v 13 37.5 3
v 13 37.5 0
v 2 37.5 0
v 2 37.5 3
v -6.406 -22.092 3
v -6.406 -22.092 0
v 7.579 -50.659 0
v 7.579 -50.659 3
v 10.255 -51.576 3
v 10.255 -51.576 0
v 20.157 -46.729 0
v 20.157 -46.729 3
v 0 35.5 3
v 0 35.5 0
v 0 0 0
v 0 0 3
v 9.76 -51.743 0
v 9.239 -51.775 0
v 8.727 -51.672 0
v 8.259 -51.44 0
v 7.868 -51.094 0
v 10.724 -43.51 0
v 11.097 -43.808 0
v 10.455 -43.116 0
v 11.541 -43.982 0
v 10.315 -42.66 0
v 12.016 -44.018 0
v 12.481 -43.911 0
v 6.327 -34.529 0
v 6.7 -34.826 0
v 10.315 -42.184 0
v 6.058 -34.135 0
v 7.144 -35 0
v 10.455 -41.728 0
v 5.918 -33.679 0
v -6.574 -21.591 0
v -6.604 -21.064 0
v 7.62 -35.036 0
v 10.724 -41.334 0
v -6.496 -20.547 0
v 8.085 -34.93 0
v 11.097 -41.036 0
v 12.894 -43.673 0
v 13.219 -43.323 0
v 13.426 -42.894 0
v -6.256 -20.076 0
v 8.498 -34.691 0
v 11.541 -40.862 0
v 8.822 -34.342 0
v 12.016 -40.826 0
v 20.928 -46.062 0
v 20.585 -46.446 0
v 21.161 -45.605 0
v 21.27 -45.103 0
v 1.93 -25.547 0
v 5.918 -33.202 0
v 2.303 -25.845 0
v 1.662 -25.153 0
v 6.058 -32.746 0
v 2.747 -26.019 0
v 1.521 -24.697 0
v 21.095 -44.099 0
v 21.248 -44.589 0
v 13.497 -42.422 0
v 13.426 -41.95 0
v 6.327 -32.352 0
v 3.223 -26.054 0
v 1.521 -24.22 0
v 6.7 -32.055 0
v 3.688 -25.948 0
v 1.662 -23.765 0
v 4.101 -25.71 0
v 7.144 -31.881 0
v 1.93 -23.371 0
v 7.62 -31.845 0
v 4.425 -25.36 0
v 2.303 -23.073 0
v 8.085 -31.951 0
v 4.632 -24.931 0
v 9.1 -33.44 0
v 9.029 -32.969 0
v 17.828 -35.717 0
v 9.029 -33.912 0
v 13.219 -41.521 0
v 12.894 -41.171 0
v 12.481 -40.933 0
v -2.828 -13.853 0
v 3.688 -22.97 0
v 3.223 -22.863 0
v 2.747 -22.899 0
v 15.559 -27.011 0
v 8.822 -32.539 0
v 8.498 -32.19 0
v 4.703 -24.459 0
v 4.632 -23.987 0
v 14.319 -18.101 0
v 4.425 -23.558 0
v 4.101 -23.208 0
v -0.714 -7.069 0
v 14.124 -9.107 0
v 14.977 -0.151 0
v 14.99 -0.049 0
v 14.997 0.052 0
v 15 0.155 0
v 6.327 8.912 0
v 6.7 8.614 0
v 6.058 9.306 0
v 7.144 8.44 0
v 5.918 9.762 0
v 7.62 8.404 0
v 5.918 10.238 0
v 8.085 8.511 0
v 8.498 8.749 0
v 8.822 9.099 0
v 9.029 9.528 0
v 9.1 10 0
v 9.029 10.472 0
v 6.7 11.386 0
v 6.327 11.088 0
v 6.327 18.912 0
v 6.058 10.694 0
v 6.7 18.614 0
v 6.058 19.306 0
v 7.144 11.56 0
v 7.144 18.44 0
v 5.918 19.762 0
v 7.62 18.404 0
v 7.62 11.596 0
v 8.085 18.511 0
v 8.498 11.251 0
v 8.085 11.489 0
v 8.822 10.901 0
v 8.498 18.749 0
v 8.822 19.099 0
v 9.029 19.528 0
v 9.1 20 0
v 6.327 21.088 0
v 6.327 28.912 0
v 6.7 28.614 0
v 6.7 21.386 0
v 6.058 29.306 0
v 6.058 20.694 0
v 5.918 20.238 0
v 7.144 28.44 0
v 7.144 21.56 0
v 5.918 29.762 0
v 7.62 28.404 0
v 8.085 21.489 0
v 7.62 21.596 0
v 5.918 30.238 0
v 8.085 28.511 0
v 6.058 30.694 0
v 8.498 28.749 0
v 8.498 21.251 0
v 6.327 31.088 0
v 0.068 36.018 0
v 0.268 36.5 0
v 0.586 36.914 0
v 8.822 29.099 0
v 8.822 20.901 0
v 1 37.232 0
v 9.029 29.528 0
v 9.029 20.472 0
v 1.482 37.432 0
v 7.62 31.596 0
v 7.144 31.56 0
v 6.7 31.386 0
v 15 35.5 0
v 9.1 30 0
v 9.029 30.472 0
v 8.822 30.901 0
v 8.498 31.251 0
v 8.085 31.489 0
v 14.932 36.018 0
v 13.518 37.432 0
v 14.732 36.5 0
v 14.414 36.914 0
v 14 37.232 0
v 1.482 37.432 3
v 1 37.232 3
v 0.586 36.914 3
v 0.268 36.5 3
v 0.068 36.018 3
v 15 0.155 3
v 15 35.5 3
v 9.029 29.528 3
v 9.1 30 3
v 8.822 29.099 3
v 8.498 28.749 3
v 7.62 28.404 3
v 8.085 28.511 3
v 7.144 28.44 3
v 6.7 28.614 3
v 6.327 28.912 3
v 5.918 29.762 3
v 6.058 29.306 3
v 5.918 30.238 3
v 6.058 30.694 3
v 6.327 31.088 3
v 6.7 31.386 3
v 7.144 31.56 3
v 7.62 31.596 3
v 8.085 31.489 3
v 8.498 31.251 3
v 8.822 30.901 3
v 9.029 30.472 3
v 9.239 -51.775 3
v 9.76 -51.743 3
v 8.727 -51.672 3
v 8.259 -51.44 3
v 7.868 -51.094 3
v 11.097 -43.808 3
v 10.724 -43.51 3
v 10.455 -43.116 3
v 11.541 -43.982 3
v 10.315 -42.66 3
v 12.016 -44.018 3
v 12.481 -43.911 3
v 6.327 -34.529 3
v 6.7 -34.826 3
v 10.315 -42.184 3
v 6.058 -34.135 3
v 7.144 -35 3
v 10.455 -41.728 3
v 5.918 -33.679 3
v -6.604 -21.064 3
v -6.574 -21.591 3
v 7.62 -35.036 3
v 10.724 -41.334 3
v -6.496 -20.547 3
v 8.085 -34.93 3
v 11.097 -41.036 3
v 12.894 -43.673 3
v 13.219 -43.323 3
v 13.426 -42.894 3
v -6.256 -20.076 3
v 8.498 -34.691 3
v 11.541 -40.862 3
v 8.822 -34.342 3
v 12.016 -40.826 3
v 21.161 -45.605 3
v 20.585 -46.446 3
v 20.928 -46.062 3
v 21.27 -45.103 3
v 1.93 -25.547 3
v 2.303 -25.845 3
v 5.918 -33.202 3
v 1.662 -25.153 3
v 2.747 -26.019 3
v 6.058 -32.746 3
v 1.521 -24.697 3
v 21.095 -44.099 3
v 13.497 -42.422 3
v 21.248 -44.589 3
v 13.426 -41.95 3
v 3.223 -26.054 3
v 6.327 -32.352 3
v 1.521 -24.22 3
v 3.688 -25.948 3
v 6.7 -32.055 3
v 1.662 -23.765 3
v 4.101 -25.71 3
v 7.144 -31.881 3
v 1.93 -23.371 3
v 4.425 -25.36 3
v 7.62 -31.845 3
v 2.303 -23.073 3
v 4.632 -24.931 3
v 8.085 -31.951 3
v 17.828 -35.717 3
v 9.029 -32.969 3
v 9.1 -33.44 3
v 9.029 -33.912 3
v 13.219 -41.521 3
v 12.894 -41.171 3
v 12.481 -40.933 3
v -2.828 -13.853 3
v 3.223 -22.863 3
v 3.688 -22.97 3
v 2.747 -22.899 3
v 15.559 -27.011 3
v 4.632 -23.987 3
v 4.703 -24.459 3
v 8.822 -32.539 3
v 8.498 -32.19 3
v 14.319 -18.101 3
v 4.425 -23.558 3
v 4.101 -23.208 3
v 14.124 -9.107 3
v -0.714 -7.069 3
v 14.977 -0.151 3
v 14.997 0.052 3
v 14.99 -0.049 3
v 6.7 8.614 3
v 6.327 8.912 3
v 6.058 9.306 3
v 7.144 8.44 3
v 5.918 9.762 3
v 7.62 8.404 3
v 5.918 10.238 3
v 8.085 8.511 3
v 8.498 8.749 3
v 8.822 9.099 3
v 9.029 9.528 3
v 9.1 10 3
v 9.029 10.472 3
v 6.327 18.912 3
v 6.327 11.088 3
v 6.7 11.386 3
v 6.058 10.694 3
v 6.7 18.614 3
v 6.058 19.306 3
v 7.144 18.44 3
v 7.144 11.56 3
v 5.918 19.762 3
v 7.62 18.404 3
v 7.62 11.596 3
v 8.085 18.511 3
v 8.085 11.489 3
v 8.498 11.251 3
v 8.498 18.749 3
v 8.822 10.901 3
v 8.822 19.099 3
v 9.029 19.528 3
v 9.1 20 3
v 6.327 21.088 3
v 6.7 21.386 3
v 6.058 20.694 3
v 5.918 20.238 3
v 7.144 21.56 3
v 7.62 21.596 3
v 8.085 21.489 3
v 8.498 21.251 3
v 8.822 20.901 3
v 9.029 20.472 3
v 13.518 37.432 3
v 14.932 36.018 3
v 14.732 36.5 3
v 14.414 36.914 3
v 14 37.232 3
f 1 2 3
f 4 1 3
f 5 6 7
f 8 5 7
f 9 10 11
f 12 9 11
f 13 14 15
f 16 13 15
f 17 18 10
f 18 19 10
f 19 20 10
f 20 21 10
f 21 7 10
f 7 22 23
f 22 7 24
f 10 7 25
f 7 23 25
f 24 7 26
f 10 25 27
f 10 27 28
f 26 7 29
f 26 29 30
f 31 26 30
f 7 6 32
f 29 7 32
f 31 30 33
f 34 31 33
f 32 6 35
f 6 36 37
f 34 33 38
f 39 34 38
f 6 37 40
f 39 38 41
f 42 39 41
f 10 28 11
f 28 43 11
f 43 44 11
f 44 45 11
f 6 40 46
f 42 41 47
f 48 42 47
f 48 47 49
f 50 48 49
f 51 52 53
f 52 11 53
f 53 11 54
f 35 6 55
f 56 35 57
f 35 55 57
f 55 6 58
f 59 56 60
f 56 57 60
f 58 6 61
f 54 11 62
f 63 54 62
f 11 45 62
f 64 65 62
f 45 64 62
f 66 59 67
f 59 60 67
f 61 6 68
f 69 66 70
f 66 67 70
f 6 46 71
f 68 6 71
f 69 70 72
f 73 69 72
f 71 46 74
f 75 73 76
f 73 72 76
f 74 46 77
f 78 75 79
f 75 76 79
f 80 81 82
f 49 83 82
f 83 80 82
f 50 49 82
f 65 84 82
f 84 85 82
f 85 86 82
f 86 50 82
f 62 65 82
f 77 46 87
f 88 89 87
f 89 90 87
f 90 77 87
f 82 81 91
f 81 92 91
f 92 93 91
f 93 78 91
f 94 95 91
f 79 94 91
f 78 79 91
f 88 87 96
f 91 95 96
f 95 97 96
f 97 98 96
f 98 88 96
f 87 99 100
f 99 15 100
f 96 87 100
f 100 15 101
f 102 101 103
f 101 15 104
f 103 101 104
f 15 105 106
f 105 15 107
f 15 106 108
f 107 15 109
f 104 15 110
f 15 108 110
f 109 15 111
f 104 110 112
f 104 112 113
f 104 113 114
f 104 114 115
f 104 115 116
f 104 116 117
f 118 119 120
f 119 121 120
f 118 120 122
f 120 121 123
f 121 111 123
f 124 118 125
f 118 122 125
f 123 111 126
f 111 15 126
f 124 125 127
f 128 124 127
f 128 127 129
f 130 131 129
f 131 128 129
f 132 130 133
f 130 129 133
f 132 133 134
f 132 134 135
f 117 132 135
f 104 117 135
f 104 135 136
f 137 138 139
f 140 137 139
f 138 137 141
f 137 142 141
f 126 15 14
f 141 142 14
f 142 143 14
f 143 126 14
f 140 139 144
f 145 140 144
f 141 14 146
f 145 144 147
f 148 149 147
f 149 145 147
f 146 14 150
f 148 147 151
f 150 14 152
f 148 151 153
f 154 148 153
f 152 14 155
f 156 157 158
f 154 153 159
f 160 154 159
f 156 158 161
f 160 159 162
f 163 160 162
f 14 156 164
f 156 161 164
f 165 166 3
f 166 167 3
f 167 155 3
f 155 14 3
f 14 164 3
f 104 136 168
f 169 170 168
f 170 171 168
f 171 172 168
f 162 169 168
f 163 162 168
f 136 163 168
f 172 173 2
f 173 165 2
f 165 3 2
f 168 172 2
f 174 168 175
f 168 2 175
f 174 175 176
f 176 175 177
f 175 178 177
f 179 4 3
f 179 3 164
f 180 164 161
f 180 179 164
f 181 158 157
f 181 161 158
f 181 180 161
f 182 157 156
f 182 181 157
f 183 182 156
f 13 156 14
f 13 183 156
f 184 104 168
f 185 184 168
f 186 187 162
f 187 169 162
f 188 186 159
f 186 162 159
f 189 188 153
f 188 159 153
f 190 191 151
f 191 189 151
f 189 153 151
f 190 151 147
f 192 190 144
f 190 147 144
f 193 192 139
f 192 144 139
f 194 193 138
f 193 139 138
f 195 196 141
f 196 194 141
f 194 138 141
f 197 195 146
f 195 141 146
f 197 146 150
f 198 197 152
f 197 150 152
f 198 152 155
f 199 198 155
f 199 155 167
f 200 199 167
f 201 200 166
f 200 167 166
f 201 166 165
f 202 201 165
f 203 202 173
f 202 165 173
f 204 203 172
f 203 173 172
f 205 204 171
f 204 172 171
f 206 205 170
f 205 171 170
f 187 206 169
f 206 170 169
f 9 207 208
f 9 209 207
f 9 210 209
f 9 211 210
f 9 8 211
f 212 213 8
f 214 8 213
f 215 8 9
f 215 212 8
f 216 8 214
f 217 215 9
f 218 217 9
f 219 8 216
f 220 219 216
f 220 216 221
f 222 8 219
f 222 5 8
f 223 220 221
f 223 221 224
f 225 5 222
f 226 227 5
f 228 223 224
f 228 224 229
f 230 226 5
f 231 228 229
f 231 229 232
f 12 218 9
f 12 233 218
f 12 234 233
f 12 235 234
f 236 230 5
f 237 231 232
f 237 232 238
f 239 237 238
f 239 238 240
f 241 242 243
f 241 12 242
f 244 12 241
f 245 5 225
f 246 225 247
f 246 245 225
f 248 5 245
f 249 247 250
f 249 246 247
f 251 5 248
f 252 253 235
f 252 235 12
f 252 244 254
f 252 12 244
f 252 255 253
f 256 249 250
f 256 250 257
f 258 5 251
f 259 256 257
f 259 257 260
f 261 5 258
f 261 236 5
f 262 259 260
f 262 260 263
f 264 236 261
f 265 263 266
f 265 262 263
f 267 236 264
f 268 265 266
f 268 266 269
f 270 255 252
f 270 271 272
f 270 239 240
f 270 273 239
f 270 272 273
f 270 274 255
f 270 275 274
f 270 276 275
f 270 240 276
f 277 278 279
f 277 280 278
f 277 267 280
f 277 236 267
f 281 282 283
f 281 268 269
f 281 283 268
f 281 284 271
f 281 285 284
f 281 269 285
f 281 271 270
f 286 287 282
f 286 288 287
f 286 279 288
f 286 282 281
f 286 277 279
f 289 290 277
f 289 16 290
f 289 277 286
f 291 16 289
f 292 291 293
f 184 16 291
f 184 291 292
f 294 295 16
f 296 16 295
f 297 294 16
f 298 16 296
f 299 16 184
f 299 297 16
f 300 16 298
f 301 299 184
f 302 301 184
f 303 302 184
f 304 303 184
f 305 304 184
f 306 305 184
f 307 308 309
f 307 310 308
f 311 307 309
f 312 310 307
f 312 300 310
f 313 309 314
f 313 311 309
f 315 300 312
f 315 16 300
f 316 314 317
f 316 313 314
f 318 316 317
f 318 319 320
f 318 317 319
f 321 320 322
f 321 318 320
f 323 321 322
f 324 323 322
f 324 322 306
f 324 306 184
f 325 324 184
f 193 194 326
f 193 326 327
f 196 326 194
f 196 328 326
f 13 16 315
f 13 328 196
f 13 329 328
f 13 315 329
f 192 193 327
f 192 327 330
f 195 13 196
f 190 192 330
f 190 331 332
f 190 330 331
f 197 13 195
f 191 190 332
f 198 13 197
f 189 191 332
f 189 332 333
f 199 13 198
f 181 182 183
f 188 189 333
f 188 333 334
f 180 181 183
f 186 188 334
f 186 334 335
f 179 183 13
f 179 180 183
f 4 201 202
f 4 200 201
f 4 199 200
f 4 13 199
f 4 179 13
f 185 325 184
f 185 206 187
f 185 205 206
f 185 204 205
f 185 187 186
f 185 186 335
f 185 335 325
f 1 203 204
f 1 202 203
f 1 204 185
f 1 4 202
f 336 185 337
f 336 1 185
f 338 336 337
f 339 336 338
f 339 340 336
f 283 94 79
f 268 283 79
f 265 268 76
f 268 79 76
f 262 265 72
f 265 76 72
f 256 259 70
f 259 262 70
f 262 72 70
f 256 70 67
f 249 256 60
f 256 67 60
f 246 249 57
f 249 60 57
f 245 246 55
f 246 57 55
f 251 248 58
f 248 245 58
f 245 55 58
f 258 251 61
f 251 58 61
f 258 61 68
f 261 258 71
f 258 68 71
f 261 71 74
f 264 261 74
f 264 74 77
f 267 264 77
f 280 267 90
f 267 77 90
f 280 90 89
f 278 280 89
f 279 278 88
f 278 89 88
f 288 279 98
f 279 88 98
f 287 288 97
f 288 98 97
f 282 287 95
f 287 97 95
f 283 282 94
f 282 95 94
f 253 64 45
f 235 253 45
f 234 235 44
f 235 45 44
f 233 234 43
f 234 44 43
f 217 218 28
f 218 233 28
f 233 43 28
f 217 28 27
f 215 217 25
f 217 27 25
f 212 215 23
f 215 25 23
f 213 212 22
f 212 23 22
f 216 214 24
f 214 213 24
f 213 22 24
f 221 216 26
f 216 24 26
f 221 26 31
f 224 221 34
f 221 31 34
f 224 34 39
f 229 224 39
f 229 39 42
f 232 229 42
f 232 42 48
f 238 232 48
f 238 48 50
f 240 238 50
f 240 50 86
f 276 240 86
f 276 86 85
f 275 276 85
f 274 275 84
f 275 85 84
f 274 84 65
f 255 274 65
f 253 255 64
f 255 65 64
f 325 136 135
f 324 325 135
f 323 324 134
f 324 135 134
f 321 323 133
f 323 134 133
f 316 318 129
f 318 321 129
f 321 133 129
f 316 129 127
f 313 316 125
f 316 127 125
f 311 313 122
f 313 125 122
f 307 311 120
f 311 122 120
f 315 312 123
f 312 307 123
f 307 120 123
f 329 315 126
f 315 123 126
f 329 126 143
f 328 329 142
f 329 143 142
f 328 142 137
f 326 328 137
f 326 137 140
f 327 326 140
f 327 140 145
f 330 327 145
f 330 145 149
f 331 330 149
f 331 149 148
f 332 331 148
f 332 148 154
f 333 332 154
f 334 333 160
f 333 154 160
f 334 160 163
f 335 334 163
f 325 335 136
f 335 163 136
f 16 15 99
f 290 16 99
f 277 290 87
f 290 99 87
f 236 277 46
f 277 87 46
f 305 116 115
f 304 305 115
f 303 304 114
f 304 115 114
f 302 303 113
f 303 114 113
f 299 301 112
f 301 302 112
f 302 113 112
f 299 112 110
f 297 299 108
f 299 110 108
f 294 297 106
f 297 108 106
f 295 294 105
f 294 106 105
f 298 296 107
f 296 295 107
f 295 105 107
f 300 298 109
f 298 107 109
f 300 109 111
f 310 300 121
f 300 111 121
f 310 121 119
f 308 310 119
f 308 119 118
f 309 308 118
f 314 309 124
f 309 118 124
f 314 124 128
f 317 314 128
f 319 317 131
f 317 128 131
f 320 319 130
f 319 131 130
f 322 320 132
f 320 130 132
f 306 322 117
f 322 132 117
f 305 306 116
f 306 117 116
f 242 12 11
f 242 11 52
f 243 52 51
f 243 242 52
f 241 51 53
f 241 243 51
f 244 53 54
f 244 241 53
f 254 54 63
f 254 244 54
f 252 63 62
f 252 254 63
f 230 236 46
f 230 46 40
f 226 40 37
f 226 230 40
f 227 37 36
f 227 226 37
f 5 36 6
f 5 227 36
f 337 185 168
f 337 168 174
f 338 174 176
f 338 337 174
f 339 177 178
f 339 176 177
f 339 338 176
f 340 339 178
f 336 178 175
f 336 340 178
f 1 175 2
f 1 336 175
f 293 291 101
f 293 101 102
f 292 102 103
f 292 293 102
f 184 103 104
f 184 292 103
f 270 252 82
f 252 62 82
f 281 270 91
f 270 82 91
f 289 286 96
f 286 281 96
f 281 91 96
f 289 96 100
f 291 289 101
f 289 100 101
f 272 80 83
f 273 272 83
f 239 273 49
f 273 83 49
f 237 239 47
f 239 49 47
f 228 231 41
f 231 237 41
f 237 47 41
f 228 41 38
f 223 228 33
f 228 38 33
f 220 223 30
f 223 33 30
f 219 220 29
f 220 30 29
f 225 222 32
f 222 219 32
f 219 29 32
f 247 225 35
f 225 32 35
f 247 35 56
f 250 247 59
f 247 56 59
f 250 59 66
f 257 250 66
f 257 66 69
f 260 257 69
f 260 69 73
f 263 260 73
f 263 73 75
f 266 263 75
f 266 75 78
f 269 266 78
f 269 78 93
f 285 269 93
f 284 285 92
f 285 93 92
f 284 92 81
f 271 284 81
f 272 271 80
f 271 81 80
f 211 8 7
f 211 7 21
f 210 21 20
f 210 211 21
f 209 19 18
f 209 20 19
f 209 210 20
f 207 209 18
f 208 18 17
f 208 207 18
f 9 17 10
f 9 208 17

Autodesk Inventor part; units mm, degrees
ref_plane "YZ Plane" through (0, 0, 0) normal (1, 0, 0) x (0, 1, 0)
ref_plane "XZ Plane" through (0, 0, 0) normal (0, 1, 0) x (-1, 0, 0)
ref_plane "XY Plane" through (0, 0, 0) normal (0, 0, 1) x (1, 0, 0)
sketch "スケッチ1" plane through (0, 0, 0) normal (0, 0, 1) x (1, 0, 0)
  circle A0 centre (11.8968, -42.422) radius 1.6 projected
  circle A1 centre (7.5, -33.4405) radius 1.6 projected
  circle A2 centre (3.1032, -24.4589) radius 1.6 projected
  circle A3 centre (7.5, 10) radius 1.6 projected
  circle A4 centre (7.5, 20) radius 1.6 projected
  circle A5 centre (7.5, 30) radius 1.6 projected
  line L0 (-6.9305, -21.0203) -> (8.4582, -52.4558)
  line L1 (8.4582, -52.4558) -> (21.9305, -45.8606)
  line L2 (15, 0) -> (15, 37.5)
  line L3 (15, 37.5) -> (0, 37.5)
  line L4 (0, 37.5) -> (0, 0)
  arc A6 (15, 0) -> (21.9305, -45.8606) centre (91.2366, -11.933) ccw
  line L5 (21.9305, -45.8606) -> (6.5418, -14.4252) construction
  arc A7 (-6.9305, -21.0203) -> (0, 0) centre (-35.3427, 0) ccw
  line L6 (6.5418, -14.4252) -> (-6.9305, -21.0203) construction
  dimension "d0" = 7.5
  dimension "d1" = 7.5
  dimension "d2" = 7.5
  dimension "d3" = 7.5
  dimension "d4" = 7.5
  dimension "d5" = 7.5
  dimension "d6" = 7.5
extrude "押し出し1" add sketch "スケッチ1" along normal blind 3
fillet "フィレット1" radius 2 6 edges at (21.9305, -45.8606, 1.5) (8.4582, -52.4558, 1.5) (-6.9305, -21.0203, 1.5) (0, 37.5, 1.5) (15, 37.5, 1.5) (15, 0, 1.5)
properties part number "オムニ_固定具寸法不明2" material "アルミニウム 6061"
